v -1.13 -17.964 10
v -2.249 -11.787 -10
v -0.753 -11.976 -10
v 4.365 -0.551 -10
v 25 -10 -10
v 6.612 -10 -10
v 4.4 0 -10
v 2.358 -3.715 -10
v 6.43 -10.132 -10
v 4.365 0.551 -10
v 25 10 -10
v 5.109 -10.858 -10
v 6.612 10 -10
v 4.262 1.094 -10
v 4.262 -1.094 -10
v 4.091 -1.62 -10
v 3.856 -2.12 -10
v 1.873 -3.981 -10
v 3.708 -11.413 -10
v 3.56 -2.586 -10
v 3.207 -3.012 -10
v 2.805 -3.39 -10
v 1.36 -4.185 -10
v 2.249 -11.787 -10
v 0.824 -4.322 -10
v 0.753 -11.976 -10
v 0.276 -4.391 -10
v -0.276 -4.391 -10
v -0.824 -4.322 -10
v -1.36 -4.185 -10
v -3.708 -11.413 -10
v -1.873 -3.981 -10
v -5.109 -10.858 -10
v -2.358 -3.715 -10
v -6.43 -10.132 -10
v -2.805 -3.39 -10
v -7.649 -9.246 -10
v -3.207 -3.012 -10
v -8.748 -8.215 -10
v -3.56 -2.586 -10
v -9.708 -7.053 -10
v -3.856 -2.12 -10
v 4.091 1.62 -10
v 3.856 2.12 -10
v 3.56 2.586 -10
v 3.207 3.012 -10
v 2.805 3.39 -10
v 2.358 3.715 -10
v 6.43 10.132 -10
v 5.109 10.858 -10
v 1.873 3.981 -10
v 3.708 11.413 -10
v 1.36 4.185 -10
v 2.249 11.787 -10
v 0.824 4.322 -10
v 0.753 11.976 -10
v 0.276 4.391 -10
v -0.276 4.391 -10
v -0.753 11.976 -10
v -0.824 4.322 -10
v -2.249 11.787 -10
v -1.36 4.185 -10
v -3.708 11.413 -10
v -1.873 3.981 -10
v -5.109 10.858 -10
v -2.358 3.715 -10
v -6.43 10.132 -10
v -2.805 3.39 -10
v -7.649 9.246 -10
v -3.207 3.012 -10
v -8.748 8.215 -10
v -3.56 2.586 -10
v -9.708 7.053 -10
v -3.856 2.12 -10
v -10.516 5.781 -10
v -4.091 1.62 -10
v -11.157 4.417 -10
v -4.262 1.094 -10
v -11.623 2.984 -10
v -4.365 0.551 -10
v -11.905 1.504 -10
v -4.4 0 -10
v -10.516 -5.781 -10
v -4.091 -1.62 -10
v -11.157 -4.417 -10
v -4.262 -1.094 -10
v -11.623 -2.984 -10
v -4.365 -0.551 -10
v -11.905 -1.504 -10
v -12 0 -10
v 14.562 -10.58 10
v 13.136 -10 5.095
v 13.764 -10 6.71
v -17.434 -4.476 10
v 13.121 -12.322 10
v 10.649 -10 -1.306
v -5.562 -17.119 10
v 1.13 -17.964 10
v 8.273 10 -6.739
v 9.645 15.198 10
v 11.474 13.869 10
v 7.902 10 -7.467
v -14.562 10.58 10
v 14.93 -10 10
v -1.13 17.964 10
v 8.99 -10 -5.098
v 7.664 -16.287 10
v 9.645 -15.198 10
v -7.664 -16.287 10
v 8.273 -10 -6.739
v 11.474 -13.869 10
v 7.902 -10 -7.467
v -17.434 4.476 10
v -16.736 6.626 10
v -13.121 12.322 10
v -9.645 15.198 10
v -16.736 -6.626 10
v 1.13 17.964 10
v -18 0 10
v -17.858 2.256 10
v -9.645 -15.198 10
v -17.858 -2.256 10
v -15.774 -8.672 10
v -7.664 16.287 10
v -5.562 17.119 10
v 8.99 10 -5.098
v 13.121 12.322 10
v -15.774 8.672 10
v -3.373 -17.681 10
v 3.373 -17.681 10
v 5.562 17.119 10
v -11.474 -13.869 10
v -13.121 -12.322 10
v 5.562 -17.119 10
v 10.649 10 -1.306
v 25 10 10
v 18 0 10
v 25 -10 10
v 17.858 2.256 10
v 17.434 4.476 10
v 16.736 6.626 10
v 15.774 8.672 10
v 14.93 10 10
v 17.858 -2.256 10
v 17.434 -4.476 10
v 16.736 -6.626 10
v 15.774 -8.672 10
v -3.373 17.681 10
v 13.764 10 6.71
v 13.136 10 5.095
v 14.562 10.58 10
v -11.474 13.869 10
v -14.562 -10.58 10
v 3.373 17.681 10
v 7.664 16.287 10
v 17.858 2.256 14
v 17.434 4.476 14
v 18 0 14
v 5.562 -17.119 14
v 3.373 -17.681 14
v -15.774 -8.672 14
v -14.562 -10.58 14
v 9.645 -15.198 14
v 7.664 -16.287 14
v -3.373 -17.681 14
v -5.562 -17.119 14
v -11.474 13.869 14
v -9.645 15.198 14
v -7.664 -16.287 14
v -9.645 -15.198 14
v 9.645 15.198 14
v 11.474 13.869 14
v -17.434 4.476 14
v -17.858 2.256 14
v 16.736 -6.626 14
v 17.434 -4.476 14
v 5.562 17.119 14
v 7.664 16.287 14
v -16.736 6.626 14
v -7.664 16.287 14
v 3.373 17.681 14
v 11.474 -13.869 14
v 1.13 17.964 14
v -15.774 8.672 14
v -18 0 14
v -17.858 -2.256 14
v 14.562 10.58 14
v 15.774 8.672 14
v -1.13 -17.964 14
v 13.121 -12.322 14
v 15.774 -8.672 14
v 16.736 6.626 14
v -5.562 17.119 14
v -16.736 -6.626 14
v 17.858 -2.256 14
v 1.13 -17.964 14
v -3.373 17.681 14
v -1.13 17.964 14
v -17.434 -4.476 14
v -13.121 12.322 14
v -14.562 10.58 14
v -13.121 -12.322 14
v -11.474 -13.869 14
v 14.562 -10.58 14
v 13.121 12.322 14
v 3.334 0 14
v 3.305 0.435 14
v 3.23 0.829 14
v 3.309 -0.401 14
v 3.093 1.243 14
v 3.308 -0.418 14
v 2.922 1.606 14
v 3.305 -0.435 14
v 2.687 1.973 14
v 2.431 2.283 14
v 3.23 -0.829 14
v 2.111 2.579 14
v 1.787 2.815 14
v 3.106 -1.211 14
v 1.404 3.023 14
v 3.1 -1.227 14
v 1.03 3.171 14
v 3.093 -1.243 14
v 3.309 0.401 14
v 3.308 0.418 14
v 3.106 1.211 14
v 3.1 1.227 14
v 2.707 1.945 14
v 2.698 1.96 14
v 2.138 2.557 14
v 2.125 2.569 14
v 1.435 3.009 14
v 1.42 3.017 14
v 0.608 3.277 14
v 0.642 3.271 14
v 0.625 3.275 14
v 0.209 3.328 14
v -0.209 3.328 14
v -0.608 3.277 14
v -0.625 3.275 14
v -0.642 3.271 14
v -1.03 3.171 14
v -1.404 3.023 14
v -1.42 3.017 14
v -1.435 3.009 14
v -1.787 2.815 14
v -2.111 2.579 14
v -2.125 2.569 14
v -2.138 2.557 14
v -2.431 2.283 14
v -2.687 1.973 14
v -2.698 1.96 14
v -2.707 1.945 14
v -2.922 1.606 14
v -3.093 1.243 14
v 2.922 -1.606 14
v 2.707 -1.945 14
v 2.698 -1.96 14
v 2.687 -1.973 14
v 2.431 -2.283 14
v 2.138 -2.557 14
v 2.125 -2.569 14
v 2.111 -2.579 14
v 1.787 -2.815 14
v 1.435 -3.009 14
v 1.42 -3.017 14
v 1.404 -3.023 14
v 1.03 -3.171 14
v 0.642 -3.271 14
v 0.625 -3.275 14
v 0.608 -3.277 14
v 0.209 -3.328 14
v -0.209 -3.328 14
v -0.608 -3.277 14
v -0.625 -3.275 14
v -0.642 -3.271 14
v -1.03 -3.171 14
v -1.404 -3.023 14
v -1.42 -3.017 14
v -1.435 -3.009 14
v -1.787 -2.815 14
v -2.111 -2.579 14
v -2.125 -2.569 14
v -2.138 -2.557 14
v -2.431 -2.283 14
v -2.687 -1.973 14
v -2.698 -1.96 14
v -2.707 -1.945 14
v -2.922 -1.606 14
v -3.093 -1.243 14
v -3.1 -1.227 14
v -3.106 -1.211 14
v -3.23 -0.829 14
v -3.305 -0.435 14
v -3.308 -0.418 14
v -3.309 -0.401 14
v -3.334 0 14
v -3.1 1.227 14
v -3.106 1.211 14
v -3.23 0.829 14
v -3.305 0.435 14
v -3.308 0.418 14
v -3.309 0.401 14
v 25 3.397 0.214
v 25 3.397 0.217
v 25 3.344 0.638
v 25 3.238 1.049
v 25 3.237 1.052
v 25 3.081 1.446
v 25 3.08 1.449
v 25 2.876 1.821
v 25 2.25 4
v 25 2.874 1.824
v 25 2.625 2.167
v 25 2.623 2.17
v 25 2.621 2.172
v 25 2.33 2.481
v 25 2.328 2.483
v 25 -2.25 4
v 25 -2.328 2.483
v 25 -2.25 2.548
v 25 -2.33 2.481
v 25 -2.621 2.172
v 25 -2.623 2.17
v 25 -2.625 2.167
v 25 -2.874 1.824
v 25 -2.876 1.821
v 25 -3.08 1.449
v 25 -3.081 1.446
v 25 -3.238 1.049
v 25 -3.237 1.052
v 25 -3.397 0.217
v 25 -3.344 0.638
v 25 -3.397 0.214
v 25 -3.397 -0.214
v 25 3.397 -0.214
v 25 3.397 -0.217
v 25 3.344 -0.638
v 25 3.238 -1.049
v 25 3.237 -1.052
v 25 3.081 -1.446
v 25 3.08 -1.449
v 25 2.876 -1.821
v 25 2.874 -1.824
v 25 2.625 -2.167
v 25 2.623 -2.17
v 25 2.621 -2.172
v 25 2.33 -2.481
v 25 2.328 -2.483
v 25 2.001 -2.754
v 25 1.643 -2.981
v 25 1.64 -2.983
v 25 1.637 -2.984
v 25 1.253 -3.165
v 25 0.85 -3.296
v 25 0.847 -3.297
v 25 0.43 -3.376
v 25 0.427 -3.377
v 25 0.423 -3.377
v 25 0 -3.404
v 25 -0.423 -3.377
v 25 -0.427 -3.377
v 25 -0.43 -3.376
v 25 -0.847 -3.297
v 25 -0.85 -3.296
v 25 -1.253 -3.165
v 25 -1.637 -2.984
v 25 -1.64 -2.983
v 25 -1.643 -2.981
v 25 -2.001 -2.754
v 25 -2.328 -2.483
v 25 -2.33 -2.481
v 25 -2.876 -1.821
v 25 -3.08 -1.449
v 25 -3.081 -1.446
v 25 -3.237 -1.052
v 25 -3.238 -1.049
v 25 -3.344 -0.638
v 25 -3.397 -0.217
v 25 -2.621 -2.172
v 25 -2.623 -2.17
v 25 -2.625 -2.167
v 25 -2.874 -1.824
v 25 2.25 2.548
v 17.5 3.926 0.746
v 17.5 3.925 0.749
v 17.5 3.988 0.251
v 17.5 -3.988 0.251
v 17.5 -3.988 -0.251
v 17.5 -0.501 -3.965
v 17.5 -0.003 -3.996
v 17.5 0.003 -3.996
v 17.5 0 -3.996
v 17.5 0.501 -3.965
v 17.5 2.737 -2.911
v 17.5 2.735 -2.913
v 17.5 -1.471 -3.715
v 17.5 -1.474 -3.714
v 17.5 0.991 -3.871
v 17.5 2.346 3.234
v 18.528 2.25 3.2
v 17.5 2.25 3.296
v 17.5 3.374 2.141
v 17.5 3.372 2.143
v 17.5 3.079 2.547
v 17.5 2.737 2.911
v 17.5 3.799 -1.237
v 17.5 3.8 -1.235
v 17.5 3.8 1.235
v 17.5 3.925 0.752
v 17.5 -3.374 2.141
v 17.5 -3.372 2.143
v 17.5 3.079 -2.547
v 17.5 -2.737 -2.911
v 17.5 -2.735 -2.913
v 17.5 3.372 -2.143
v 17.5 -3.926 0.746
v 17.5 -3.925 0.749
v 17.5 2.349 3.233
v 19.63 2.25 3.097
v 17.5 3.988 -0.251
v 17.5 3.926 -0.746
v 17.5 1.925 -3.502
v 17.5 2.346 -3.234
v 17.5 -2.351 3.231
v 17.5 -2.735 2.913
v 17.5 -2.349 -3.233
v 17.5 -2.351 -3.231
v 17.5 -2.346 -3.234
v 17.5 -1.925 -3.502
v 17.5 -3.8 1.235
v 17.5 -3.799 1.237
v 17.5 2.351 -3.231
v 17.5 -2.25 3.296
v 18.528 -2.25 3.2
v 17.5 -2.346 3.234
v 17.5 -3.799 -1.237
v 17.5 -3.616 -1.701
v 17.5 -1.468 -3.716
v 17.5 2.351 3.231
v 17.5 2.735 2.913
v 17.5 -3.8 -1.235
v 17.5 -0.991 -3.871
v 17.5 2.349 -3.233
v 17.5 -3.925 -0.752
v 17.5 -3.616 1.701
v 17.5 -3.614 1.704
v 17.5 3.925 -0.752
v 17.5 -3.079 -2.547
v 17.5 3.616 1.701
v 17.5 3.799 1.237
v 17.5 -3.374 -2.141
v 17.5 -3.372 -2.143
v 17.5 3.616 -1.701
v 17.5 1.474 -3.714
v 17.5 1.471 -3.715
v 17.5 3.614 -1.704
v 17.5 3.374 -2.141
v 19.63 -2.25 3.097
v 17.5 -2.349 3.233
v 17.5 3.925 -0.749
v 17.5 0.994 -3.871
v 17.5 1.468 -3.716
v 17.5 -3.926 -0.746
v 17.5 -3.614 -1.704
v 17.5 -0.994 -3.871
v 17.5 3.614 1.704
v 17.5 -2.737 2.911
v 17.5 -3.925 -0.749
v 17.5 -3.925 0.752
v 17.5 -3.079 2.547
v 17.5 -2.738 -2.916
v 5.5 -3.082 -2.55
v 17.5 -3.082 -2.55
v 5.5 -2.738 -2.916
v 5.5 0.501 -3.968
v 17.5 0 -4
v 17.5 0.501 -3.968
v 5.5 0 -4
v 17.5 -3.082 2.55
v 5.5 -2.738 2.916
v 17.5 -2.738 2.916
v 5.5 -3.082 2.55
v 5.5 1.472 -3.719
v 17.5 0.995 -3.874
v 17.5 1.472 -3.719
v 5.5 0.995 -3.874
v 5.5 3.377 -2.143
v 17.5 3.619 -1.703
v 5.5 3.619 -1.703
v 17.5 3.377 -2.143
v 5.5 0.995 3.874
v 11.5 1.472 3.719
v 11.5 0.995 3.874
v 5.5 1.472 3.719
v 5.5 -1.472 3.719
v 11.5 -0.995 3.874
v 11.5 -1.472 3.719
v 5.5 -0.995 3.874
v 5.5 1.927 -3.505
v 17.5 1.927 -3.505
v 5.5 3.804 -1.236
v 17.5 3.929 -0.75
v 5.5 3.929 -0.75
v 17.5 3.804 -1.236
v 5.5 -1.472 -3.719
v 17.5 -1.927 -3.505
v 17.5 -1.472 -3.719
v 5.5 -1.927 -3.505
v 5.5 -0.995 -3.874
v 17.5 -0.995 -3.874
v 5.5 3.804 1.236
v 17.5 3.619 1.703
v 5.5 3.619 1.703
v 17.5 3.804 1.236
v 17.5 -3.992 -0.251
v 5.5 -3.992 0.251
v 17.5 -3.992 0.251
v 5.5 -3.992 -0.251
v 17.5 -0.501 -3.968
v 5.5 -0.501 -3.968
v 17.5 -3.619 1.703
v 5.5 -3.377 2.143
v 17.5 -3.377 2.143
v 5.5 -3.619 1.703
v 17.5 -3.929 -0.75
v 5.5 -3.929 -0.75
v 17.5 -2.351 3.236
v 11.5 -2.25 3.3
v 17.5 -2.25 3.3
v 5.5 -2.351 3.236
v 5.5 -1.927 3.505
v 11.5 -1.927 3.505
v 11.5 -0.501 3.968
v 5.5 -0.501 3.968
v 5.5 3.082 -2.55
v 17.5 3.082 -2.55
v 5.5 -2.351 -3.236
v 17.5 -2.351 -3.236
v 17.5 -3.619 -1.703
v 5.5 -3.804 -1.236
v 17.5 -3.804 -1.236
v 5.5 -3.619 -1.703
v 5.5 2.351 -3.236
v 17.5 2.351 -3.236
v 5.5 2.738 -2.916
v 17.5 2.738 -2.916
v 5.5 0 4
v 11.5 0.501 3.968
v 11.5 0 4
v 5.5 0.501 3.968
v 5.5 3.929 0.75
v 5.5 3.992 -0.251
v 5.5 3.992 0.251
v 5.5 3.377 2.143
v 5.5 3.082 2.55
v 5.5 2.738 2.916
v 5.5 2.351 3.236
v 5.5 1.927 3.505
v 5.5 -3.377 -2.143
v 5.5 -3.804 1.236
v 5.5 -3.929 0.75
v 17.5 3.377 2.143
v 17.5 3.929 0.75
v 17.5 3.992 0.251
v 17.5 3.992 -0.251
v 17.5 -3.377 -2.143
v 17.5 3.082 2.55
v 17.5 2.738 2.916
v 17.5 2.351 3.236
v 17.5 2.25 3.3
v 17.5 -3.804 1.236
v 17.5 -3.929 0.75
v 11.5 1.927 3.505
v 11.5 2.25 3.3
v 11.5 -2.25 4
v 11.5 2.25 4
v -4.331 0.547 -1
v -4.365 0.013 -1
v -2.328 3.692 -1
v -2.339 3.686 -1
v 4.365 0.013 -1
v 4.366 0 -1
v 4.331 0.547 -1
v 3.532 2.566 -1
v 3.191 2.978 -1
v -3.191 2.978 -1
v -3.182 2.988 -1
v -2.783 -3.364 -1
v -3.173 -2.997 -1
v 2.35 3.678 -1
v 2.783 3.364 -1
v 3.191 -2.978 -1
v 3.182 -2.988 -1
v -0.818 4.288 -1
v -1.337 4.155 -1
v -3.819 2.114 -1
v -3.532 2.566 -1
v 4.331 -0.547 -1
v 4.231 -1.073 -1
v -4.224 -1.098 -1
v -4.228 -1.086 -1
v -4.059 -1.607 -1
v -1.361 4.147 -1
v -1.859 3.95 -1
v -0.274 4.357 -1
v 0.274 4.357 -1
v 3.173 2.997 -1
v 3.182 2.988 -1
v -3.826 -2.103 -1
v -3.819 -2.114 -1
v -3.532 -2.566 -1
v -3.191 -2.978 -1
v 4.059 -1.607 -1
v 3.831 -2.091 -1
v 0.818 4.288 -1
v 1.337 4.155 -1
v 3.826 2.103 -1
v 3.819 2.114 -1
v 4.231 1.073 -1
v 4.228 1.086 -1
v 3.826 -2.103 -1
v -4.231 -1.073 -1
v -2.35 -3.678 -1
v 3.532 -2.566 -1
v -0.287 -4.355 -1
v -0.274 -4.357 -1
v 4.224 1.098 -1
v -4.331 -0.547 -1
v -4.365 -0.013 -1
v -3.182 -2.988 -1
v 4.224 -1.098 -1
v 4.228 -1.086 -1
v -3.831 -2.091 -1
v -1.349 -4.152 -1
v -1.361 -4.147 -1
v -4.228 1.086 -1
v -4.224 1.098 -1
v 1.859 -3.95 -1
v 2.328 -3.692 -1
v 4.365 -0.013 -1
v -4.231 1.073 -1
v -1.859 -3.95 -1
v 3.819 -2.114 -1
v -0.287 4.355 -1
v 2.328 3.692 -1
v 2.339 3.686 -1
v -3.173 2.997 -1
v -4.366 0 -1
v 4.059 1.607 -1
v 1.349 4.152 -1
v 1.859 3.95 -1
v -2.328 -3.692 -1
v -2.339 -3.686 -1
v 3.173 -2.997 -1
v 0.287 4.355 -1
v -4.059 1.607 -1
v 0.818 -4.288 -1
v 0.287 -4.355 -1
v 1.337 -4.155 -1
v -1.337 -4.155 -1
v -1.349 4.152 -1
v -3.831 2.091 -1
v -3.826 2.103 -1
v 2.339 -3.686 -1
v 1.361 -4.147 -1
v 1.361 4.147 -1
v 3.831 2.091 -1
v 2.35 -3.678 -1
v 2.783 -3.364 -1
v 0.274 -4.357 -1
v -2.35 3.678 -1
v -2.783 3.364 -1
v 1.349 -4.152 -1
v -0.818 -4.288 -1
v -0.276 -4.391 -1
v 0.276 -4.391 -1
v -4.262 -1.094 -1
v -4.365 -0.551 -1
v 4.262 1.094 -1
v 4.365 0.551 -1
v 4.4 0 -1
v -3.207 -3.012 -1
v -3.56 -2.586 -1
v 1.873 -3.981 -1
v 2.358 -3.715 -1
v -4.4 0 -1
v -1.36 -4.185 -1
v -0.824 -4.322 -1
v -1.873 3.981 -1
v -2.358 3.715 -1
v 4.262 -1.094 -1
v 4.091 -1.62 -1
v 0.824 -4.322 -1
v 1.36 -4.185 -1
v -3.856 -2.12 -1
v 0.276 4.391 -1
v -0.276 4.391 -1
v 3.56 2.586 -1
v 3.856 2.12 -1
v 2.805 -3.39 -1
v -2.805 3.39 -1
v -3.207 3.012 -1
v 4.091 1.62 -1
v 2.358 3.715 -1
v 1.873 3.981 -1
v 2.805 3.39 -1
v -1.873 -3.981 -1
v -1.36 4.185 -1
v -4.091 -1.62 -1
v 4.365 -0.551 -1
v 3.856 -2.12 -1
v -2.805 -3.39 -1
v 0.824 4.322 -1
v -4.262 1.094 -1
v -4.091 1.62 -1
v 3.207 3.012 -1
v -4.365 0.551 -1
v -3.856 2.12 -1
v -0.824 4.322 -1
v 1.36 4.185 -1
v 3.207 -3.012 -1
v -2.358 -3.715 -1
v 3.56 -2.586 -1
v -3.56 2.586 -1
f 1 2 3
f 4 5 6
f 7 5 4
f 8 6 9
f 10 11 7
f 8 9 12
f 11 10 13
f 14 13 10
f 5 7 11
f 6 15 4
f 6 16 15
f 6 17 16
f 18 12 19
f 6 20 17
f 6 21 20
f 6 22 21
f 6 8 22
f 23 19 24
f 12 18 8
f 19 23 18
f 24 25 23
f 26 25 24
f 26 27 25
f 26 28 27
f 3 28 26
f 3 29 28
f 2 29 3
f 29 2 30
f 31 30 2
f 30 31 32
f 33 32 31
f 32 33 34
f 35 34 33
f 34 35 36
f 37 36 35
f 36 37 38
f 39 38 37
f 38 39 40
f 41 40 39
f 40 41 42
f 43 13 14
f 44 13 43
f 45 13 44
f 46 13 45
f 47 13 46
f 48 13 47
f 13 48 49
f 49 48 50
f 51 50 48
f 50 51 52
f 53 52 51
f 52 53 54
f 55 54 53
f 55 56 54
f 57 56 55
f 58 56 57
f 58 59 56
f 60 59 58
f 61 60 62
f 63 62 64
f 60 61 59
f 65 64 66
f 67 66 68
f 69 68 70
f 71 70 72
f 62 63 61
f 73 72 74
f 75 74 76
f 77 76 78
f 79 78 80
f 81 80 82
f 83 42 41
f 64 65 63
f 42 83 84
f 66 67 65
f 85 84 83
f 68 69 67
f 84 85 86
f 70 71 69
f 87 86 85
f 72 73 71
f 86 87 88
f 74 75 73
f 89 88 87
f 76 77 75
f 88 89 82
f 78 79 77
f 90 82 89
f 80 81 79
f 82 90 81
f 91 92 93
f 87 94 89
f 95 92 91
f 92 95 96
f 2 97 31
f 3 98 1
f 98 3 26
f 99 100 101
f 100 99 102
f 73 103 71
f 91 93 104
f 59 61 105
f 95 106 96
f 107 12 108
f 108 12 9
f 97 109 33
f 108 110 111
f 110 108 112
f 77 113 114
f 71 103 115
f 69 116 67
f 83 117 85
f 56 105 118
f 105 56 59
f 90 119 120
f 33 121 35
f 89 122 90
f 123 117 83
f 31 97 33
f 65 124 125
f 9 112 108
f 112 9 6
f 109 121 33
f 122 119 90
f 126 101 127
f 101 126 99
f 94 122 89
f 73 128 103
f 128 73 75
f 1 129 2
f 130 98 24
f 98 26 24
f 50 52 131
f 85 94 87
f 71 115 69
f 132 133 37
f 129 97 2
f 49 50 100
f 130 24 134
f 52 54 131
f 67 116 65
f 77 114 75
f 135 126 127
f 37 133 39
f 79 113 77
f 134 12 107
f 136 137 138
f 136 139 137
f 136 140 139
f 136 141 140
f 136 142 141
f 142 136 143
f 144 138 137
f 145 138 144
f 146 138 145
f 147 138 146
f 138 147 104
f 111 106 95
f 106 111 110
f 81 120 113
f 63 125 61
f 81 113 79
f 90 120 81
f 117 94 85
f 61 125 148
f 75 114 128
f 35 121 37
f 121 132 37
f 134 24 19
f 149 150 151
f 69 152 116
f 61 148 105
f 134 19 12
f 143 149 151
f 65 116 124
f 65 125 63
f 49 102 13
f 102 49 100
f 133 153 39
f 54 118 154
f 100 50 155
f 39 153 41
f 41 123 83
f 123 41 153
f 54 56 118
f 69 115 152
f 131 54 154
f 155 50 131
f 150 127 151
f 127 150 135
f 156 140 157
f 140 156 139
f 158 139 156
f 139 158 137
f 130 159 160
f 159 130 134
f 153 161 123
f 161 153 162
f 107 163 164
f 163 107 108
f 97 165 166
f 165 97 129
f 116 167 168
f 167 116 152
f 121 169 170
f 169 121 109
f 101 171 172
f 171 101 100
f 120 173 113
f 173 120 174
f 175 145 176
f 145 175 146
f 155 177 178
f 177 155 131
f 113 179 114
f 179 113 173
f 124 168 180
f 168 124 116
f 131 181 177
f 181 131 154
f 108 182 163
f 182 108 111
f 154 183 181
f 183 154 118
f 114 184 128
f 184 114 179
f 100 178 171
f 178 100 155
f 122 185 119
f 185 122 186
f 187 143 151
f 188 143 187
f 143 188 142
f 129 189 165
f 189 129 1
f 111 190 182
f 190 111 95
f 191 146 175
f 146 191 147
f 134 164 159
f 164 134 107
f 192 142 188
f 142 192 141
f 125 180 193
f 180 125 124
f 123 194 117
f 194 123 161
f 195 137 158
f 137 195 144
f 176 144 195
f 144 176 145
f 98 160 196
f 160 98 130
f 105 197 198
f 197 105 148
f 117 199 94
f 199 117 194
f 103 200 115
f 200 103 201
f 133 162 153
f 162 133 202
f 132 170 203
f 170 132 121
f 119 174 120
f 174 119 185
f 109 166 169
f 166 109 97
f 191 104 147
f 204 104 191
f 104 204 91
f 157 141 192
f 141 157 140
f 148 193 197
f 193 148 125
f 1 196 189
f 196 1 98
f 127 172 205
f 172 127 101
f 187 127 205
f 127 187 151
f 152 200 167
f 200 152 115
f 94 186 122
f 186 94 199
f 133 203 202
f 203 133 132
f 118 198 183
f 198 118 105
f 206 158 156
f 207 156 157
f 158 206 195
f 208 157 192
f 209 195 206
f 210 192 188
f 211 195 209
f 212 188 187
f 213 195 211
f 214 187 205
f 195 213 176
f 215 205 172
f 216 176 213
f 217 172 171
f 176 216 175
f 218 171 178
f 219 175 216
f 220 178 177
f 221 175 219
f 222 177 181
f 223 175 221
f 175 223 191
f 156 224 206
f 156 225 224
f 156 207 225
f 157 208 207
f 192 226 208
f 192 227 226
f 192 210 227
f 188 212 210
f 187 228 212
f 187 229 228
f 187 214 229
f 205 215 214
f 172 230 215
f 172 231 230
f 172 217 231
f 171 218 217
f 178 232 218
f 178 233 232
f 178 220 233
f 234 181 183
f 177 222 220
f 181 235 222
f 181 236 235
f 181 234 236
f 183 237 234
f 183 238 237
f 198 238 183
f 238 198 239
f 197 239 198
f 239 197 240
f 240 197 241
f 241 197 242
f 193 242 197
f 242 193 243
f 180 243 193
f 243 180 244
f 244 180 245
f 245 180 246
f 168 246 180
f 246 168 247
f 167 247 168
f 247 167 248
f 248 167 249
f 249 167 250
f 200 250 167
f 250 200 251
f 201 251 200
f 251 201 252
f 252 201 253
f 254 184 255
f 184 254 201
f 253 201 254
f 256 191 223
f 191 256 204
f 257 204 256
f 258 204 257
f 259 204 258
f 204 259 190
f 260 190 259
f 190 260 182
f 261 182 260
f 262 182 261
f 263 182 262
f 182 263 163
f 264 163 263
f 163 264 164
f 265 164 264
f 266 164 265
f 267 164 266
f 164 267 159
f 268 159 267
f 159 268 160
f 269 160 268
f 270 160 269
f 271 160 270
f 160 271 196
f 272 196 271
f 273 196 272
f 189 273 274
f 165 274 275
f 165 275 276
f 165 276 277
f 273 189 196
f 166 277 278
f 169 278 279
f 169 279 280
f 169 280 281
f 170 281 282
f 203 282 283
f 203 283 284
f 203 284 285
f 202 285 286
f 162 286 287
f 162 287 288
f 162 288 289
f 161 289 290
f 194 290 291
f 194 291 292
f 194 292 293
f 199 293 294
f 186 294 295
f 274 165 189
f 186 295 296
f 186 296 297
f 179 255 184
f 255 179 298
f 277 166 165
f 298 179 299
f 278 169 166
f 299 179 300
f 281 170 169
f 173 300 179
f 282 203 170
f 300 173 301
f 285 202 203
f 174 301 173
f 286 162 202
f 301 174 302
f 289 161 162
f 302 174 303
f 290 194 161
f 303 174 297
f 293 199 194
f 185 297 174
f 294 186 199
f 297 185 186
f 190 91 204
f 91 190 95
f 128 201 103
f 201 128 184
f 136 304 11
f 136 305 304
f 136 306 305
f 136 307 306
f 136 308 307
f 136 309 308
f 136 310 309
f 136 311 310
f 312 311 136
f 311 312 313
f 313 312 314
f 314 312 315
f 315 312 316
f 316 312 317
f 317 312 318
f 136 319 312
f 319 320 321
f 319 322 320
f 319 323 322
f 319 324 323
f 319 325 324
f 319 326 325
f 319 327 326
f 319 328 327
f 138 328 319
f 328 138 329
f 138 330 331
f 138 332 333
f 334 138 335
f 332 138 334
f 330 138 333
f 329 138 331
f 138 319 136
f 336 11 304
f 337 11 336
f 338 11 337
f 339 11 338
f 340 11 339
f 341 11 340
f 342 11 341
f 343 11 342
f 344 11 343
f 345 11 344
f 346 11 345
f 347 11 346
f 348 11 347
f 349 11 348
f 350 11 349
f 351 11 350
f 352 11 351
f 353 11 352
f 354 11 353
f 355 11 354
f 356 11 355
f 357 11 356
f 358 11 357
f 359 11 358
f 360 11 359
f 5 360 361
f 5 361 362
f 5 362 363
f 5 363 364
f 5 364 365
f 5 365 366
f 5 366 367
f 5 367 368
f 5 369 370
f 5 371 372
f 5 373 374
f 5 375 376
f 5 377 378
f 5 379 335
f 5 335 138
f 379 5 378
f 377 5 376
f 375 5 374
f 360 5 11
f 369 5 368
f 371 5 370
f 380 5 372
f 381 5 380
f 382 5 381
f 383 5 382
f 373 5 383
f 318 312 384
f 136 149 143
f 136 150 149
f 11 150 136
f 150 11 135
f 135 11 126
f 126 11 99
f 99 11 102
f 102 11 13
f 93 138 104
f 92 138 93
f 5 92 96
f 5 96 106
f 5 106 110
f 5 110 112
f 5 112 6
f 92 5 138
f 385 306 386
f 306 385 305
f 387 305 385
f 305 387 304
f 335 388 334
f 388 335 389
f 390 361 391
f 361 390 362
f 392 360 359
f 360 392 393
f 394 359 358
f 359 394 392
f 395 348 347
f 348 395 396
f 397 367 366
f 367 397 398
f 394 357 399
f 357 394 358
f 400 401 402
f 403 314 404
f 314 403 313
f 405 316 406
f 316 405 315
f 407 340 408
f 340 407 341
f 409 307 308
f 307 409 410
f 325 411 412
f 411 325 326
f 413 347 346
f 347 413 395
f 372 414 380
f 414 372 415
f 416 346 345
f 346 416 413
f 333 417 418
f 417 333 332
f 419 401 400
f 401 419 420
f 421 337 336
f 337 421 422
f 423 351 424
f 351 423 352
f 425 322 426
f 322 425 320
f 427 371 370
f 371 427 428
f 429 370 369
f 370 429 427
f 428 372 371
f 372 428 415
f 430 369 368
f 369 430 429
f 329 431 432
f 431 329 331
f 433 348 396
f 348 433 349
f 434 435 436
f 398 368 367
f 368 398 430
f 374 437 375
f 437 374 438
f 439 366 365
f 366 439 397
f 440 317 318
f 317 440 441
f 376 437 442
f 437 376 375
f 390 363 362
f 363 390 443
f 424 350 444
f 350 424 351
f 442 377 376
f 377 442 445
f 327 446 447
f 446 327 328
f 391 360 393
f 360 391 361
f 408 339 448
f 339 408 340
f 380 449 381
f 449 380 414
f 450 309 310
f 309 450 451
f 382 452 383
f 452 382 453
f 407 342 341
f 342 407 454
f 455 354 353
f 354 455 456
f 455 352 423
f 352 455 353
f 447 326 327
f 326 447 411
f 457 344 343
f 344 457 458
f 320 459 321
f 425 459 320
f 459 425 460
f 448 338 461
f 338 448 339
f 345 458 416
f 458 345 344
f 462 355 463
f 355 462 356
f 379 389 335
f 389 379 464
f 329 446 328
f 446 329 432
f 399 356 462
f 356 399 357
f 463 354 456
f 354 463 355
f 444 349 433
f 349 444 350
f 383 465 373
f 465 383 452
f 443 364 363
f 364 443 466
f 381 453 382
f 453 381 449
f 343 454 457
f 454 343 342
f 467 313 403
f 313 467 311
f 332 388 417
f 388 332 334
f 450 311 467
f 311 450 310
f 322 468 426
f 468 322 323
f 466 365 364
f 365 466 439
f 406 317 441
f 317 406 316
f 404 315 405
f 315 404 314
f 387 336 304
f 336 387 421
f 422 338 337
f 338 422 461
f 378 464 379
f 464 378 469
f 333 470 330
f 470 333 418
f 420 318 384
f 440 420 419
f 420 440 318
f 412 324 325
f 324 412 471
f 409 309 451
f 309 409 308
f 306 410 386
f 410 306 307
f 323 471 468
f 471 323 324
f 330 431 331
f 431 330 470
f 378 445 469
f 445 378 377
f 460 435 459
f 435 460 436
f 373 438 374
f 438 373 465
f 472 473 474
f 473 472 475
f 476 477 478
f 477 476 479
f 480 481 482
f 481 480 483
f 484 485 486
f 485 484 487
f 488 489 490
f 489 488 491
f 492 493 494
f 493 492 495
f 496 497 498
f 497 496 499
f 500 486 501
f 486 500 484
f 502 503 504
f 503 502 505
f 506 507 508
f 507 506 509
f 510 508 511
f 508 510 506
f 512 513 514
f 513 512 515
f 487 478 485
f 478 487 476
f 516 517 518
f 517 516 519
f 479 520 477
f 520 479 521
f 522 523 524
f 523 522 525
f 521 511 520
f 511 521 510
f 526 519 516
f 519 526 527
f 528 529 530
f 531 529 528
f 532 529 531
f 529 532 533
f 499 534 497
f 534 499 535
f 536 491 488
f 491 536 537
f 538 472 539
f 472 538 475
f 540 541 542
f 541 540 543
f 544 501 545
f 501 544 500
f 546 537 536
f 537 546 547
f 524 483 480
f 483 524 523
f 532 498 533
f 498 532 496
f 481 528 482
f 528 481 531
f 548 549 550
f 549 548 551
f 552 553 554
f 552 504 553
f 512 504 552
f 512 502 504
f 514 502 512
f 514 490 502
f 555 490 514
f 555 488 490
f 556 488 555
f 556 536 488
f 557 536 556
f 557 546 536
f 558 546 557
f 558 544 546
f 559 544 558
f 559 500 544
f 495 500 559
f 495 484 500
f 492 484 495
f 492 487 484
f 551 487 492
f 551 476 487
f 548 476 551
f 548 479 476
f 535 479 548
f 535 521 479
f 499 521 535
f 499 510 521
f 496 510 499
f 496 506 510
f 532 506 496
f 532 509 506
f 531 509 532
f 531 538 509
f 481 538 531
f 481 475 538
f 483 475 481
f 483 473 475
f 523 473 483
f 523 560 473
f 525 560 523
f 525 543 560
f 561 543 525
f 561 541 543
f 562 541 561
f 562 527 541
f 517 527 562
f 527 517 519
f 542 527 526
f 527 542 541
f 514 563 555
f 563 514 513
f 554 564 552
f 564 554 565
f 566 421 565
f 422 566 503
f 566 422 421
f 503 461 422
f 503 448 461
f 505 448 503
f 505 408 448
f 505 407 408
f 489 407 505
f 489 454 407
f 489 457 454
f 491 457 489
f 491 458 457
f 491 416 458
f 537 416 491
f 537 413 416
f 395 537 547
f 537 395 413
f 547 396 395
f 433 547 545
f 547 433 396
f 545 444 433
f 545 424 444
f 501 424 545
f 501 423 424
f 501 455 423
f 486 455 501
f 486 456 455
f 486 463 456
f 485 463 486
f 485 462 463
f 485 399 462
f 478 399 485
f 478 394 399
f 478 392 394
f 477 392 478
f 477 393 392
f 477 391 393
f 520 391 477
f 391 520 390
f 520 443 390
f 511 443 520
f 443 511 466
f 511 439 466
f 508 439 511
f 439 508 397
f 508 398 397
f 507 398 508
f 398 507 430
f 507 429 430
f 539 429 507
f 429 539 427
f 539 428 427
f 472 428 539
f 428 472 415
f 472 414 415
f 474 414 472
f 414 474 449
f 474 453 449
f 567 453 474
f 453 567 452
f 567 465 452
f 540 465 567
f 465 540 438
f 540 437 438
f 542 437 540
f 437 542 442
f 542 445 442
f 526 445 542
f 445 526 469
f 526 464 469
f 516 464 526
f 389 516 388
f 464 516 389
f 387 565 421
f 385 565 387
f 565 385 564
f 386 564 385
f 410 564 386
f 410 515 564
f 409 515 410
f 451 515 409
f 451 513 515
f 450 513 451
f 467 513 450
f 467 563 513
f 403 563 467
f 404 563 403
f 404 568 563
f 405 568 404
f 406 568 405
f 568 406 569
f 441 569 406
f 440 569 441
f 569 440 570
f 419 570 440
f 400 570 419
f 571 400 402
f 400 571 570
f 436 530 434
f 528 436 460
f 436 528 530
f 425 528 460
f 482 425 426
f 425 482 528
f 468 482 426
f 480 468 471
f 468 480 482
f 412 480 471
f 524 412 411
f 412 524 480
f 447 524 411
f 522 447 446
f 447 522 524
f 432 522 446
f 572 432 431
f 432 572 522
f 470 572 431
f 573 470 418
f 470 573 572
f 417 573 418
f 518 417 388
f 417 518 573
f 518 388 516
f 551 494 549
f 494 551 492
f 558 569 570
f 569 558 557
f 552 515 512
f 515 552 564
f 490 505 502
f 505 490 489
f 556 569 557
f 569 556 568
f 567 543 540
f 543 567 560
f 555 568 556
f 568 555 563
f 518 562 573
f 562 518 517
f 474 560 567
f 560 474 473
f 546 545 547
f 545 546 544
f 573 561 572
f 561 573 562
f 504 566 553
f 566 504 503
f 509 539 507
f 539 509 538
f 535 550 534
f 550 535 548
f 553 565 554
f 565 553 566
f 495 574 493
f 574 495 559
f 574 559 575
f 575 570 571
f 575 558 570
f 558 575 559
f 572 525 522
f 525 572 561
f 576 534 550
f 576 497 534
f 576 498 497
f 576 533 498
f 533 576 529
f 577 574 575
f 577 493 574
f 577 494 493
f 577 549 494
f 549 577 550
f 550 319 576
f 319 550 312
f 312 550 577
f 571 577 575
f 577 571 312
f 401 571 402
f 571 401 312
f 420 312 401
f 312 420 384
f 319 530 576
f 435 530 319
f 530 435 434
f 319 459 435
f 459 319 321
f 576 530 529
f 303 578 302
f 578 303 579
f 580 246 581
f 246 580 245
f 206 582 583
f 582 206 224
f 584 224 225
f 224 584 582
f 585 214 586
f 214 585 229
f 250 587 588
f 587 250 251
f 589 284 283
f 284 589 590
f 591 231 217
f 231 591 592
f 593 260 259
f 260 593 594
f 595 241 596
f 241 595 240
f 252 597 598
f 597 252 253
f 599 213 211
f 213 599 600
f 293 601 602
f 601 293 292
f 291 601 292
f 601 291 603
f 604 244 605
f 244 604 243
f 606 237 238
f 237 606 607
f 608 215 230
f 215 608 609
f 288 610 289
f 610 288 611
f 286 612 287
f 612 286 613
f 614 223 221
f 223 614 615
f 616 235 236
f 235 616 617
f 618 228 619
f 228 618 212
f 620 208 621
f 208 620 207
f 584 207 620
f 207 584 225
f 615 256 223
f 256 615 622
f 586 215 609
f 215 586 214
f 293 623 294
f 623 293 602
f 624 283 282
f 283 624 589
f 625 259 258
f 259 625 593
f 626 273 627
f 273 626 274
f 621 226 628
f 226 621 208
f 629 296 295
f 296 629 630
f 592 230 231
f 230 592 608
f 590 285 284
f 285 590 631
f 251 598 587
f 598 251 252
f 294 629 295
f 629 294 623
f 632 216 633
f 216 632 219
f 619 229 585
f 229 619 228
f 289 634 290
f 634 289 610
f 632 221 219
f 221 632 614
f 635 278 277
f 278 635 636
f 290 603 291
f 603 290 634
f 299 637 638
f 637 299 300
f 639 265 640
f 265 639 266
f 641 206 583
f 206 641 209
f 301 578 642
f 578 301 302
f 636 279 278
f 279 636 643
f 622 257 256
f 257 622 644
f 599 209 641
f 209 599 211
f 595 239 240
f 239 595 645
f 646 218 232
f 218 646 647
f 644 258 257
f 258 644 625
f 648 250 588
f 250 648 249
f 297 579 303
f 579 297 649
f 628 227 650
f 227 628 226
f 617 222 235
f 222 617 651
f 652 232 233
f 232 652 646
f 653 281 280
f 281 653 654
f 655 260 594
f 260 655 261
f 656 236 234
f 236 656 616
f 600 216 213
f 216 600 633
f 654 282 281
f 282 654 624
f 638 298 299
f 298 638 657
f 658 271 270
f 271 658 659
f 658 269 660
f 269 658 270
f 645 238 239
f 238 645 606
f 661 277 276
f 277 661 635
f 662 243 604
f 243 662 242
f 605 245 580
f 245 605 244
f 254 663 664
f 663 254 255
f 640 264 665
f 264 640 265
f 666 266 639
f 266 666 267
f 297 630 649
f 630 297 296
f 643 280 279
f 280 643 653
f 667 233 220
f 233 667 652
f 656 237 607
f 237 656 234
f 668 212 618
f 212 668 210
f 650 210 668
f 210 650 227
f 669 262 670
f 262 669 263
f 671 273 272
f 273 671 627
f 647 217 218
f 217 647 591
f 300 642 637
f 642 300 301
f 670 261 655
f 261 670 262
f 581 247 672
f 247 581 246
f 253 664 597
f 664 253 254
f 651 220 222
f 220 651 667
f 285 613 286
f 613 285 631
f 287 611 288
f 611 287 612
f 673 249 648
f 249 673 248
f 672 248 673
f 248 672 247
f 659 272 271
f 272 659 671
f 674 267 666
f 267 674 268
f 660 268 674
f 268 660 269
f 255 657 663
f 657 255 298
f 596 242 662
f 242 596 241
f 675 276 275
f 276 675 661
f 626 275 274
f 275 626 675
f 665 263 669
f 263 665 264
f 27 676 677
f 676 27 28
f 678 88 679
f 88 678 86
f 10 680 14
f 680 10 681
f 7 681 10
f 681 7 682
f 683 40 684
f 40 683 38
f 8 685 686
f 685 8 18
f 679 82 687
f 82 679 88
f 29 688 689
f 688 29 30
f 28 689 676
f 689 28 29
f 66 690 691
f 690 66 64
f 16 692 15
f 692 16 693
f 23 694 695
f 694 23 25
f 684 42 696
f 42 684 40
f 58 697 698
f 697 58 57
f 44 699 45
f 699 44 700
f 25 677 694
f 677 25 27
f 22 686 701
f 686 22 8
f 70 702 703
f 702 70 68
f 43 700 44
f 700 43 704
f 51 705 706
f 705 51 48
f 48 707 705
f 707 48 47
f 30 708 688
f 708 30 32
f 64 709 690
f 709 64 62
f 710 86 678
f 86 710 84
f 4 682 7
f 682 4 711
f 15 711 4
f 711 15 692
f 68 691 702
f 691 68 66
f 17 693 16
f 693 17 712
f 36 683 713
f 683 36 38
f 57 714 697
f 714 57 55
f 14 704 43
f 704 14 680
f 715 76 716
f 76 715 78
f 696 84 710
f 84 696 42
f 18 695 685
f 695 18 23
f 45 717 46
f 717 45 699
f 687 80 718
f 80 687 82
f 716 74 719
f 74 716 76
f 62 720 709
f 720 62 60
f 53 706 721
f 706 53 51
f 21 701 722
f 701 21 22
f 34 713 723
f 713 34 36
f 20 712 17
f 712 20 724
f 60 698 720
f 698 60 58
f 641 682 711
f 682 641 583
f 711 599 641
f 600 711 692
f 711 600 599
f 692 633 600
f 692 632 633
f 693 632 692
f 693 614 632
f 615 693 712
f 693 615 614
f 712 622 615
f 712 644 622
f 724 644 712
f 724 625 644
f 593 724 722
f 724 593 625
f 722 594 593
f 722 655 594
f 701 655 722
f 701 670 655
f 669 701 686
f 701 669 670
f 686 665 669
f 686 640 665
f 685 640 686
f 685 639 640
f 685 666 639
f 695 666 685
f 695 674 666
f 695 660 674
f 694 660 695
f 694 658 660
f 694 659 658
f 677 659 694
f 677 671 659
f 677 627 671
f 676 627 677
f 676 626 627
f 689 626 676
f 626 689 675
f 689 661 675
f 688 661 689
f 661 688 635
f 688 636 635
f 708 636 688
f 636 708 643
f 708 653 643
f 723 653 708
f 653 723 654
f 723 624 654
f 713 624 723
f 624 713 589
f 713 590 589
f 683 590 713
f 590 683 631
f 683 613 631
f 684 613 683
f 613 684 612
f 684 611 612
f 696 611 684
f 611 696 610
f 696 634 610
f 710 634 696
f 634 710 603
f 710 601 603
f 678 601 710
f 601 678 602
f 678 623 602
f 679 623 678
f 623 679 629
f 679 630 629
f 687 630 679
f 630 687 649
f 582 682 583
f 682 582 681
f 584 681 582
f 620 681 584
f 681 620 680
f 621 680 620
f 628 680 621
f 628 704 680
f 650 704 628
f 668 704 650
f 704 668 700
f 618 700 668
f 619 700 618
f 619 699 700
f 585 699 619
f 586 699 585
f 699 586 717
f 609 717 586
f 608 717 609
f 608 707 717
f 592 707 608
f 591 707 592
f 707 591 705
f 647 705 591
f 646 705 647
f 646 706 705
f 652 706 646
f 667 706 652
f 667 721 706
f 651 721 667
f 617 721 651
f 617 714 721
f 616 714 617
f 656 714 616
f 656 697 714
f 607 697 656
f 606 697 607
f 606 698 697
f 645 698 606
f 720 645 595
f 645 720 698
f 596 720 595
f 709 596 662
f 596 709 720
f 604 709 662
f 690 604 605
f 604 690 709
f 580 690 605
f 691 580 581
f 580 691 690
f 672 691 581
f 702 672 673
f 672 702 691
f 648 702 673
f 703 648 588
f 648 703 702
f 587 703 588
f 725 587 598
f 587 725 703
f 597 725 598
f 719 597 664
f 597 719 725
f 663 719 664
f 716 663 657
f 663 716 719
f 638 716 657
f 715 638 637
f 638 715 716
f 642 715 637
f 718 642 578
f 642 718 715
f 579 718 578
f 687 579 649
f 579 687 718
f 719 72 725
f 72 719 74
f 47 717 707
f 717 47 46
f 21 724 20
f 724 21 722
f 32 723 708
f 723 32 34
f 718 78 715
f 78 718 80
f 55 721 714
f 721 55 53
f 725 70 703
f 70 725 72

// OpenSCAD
topRadius = 18;
bottomRadius = 12;

topPinTopRadius = 3.3;
topPinMiddleRadius = 4.4;
topPinDepth = 15;

sidePinTopRadius = 3.4;
sidePinMiddleRadius = 4;
sidePinDepth = 7.5;
relayWidth = 20;
relayOffset = 25;
thickness = 20;

coreHeight = relayWidth;
spacerHeight = 4;

$fn = 50;

difference() 
{
    union()
    {
        cylinder(r1 = bottomRadius, r2 = topRadius, h = relayWidth, center = true);
        
        translate([0, 0, (coreHeight / 2) + (spacerHeight / 2)])
            cylinder(r = topRadius, h = spacerHeight, center = true);
        
        translate([relayOffset - (thickness / 2), 0, 0])
        {
            cube([thickness, relayWidth, relayWidth], center = true);
        }
        
    }
    
    translate([0, 0, (coreHeight / 2) - (topPinDepth / 2) + spacerHeight])
    {
        cylinder(r1 = topPinMiddleRadius, r2 = topPinTopRadius, h = topPinDepth + 1, center = true);
    }
    
    translate([0, 0, (coreHeight / 2) - (topPinDepth) - 10 + spacerHeight])
    {
        cylinder(r = topPinMiddleRadius, h = 20, center = true);
    }
    
    rotate(a = 90, v = [0, 1, 0])
    {
        translate([0, 0, relayOffset])
        {
            translate([0, 0, -(sidePinDepth / 2)])
            {
                cylinder (r1 = sidePinMiddleRadius, r2 = sidePinTopRadius, h = sidePinDepth + .1, center = true);
            }
            
            translate([0, 0, -sidePinDepth - 6])
            {
                cylinder (r = sidePinMiddleRadius, h = 12, center = true);
            }
            
        }
        
            bridgeWidth = 4.5;
            translate([-(sidePinMiddleRadius - bridgeWidth / 2), 0, relayOffset - (sidePinDepth / 2)])
            {
                cube([bridgeWidth, bridgeWidth, sidePinDepth + 12], center = true);
            }
        
    }
}
